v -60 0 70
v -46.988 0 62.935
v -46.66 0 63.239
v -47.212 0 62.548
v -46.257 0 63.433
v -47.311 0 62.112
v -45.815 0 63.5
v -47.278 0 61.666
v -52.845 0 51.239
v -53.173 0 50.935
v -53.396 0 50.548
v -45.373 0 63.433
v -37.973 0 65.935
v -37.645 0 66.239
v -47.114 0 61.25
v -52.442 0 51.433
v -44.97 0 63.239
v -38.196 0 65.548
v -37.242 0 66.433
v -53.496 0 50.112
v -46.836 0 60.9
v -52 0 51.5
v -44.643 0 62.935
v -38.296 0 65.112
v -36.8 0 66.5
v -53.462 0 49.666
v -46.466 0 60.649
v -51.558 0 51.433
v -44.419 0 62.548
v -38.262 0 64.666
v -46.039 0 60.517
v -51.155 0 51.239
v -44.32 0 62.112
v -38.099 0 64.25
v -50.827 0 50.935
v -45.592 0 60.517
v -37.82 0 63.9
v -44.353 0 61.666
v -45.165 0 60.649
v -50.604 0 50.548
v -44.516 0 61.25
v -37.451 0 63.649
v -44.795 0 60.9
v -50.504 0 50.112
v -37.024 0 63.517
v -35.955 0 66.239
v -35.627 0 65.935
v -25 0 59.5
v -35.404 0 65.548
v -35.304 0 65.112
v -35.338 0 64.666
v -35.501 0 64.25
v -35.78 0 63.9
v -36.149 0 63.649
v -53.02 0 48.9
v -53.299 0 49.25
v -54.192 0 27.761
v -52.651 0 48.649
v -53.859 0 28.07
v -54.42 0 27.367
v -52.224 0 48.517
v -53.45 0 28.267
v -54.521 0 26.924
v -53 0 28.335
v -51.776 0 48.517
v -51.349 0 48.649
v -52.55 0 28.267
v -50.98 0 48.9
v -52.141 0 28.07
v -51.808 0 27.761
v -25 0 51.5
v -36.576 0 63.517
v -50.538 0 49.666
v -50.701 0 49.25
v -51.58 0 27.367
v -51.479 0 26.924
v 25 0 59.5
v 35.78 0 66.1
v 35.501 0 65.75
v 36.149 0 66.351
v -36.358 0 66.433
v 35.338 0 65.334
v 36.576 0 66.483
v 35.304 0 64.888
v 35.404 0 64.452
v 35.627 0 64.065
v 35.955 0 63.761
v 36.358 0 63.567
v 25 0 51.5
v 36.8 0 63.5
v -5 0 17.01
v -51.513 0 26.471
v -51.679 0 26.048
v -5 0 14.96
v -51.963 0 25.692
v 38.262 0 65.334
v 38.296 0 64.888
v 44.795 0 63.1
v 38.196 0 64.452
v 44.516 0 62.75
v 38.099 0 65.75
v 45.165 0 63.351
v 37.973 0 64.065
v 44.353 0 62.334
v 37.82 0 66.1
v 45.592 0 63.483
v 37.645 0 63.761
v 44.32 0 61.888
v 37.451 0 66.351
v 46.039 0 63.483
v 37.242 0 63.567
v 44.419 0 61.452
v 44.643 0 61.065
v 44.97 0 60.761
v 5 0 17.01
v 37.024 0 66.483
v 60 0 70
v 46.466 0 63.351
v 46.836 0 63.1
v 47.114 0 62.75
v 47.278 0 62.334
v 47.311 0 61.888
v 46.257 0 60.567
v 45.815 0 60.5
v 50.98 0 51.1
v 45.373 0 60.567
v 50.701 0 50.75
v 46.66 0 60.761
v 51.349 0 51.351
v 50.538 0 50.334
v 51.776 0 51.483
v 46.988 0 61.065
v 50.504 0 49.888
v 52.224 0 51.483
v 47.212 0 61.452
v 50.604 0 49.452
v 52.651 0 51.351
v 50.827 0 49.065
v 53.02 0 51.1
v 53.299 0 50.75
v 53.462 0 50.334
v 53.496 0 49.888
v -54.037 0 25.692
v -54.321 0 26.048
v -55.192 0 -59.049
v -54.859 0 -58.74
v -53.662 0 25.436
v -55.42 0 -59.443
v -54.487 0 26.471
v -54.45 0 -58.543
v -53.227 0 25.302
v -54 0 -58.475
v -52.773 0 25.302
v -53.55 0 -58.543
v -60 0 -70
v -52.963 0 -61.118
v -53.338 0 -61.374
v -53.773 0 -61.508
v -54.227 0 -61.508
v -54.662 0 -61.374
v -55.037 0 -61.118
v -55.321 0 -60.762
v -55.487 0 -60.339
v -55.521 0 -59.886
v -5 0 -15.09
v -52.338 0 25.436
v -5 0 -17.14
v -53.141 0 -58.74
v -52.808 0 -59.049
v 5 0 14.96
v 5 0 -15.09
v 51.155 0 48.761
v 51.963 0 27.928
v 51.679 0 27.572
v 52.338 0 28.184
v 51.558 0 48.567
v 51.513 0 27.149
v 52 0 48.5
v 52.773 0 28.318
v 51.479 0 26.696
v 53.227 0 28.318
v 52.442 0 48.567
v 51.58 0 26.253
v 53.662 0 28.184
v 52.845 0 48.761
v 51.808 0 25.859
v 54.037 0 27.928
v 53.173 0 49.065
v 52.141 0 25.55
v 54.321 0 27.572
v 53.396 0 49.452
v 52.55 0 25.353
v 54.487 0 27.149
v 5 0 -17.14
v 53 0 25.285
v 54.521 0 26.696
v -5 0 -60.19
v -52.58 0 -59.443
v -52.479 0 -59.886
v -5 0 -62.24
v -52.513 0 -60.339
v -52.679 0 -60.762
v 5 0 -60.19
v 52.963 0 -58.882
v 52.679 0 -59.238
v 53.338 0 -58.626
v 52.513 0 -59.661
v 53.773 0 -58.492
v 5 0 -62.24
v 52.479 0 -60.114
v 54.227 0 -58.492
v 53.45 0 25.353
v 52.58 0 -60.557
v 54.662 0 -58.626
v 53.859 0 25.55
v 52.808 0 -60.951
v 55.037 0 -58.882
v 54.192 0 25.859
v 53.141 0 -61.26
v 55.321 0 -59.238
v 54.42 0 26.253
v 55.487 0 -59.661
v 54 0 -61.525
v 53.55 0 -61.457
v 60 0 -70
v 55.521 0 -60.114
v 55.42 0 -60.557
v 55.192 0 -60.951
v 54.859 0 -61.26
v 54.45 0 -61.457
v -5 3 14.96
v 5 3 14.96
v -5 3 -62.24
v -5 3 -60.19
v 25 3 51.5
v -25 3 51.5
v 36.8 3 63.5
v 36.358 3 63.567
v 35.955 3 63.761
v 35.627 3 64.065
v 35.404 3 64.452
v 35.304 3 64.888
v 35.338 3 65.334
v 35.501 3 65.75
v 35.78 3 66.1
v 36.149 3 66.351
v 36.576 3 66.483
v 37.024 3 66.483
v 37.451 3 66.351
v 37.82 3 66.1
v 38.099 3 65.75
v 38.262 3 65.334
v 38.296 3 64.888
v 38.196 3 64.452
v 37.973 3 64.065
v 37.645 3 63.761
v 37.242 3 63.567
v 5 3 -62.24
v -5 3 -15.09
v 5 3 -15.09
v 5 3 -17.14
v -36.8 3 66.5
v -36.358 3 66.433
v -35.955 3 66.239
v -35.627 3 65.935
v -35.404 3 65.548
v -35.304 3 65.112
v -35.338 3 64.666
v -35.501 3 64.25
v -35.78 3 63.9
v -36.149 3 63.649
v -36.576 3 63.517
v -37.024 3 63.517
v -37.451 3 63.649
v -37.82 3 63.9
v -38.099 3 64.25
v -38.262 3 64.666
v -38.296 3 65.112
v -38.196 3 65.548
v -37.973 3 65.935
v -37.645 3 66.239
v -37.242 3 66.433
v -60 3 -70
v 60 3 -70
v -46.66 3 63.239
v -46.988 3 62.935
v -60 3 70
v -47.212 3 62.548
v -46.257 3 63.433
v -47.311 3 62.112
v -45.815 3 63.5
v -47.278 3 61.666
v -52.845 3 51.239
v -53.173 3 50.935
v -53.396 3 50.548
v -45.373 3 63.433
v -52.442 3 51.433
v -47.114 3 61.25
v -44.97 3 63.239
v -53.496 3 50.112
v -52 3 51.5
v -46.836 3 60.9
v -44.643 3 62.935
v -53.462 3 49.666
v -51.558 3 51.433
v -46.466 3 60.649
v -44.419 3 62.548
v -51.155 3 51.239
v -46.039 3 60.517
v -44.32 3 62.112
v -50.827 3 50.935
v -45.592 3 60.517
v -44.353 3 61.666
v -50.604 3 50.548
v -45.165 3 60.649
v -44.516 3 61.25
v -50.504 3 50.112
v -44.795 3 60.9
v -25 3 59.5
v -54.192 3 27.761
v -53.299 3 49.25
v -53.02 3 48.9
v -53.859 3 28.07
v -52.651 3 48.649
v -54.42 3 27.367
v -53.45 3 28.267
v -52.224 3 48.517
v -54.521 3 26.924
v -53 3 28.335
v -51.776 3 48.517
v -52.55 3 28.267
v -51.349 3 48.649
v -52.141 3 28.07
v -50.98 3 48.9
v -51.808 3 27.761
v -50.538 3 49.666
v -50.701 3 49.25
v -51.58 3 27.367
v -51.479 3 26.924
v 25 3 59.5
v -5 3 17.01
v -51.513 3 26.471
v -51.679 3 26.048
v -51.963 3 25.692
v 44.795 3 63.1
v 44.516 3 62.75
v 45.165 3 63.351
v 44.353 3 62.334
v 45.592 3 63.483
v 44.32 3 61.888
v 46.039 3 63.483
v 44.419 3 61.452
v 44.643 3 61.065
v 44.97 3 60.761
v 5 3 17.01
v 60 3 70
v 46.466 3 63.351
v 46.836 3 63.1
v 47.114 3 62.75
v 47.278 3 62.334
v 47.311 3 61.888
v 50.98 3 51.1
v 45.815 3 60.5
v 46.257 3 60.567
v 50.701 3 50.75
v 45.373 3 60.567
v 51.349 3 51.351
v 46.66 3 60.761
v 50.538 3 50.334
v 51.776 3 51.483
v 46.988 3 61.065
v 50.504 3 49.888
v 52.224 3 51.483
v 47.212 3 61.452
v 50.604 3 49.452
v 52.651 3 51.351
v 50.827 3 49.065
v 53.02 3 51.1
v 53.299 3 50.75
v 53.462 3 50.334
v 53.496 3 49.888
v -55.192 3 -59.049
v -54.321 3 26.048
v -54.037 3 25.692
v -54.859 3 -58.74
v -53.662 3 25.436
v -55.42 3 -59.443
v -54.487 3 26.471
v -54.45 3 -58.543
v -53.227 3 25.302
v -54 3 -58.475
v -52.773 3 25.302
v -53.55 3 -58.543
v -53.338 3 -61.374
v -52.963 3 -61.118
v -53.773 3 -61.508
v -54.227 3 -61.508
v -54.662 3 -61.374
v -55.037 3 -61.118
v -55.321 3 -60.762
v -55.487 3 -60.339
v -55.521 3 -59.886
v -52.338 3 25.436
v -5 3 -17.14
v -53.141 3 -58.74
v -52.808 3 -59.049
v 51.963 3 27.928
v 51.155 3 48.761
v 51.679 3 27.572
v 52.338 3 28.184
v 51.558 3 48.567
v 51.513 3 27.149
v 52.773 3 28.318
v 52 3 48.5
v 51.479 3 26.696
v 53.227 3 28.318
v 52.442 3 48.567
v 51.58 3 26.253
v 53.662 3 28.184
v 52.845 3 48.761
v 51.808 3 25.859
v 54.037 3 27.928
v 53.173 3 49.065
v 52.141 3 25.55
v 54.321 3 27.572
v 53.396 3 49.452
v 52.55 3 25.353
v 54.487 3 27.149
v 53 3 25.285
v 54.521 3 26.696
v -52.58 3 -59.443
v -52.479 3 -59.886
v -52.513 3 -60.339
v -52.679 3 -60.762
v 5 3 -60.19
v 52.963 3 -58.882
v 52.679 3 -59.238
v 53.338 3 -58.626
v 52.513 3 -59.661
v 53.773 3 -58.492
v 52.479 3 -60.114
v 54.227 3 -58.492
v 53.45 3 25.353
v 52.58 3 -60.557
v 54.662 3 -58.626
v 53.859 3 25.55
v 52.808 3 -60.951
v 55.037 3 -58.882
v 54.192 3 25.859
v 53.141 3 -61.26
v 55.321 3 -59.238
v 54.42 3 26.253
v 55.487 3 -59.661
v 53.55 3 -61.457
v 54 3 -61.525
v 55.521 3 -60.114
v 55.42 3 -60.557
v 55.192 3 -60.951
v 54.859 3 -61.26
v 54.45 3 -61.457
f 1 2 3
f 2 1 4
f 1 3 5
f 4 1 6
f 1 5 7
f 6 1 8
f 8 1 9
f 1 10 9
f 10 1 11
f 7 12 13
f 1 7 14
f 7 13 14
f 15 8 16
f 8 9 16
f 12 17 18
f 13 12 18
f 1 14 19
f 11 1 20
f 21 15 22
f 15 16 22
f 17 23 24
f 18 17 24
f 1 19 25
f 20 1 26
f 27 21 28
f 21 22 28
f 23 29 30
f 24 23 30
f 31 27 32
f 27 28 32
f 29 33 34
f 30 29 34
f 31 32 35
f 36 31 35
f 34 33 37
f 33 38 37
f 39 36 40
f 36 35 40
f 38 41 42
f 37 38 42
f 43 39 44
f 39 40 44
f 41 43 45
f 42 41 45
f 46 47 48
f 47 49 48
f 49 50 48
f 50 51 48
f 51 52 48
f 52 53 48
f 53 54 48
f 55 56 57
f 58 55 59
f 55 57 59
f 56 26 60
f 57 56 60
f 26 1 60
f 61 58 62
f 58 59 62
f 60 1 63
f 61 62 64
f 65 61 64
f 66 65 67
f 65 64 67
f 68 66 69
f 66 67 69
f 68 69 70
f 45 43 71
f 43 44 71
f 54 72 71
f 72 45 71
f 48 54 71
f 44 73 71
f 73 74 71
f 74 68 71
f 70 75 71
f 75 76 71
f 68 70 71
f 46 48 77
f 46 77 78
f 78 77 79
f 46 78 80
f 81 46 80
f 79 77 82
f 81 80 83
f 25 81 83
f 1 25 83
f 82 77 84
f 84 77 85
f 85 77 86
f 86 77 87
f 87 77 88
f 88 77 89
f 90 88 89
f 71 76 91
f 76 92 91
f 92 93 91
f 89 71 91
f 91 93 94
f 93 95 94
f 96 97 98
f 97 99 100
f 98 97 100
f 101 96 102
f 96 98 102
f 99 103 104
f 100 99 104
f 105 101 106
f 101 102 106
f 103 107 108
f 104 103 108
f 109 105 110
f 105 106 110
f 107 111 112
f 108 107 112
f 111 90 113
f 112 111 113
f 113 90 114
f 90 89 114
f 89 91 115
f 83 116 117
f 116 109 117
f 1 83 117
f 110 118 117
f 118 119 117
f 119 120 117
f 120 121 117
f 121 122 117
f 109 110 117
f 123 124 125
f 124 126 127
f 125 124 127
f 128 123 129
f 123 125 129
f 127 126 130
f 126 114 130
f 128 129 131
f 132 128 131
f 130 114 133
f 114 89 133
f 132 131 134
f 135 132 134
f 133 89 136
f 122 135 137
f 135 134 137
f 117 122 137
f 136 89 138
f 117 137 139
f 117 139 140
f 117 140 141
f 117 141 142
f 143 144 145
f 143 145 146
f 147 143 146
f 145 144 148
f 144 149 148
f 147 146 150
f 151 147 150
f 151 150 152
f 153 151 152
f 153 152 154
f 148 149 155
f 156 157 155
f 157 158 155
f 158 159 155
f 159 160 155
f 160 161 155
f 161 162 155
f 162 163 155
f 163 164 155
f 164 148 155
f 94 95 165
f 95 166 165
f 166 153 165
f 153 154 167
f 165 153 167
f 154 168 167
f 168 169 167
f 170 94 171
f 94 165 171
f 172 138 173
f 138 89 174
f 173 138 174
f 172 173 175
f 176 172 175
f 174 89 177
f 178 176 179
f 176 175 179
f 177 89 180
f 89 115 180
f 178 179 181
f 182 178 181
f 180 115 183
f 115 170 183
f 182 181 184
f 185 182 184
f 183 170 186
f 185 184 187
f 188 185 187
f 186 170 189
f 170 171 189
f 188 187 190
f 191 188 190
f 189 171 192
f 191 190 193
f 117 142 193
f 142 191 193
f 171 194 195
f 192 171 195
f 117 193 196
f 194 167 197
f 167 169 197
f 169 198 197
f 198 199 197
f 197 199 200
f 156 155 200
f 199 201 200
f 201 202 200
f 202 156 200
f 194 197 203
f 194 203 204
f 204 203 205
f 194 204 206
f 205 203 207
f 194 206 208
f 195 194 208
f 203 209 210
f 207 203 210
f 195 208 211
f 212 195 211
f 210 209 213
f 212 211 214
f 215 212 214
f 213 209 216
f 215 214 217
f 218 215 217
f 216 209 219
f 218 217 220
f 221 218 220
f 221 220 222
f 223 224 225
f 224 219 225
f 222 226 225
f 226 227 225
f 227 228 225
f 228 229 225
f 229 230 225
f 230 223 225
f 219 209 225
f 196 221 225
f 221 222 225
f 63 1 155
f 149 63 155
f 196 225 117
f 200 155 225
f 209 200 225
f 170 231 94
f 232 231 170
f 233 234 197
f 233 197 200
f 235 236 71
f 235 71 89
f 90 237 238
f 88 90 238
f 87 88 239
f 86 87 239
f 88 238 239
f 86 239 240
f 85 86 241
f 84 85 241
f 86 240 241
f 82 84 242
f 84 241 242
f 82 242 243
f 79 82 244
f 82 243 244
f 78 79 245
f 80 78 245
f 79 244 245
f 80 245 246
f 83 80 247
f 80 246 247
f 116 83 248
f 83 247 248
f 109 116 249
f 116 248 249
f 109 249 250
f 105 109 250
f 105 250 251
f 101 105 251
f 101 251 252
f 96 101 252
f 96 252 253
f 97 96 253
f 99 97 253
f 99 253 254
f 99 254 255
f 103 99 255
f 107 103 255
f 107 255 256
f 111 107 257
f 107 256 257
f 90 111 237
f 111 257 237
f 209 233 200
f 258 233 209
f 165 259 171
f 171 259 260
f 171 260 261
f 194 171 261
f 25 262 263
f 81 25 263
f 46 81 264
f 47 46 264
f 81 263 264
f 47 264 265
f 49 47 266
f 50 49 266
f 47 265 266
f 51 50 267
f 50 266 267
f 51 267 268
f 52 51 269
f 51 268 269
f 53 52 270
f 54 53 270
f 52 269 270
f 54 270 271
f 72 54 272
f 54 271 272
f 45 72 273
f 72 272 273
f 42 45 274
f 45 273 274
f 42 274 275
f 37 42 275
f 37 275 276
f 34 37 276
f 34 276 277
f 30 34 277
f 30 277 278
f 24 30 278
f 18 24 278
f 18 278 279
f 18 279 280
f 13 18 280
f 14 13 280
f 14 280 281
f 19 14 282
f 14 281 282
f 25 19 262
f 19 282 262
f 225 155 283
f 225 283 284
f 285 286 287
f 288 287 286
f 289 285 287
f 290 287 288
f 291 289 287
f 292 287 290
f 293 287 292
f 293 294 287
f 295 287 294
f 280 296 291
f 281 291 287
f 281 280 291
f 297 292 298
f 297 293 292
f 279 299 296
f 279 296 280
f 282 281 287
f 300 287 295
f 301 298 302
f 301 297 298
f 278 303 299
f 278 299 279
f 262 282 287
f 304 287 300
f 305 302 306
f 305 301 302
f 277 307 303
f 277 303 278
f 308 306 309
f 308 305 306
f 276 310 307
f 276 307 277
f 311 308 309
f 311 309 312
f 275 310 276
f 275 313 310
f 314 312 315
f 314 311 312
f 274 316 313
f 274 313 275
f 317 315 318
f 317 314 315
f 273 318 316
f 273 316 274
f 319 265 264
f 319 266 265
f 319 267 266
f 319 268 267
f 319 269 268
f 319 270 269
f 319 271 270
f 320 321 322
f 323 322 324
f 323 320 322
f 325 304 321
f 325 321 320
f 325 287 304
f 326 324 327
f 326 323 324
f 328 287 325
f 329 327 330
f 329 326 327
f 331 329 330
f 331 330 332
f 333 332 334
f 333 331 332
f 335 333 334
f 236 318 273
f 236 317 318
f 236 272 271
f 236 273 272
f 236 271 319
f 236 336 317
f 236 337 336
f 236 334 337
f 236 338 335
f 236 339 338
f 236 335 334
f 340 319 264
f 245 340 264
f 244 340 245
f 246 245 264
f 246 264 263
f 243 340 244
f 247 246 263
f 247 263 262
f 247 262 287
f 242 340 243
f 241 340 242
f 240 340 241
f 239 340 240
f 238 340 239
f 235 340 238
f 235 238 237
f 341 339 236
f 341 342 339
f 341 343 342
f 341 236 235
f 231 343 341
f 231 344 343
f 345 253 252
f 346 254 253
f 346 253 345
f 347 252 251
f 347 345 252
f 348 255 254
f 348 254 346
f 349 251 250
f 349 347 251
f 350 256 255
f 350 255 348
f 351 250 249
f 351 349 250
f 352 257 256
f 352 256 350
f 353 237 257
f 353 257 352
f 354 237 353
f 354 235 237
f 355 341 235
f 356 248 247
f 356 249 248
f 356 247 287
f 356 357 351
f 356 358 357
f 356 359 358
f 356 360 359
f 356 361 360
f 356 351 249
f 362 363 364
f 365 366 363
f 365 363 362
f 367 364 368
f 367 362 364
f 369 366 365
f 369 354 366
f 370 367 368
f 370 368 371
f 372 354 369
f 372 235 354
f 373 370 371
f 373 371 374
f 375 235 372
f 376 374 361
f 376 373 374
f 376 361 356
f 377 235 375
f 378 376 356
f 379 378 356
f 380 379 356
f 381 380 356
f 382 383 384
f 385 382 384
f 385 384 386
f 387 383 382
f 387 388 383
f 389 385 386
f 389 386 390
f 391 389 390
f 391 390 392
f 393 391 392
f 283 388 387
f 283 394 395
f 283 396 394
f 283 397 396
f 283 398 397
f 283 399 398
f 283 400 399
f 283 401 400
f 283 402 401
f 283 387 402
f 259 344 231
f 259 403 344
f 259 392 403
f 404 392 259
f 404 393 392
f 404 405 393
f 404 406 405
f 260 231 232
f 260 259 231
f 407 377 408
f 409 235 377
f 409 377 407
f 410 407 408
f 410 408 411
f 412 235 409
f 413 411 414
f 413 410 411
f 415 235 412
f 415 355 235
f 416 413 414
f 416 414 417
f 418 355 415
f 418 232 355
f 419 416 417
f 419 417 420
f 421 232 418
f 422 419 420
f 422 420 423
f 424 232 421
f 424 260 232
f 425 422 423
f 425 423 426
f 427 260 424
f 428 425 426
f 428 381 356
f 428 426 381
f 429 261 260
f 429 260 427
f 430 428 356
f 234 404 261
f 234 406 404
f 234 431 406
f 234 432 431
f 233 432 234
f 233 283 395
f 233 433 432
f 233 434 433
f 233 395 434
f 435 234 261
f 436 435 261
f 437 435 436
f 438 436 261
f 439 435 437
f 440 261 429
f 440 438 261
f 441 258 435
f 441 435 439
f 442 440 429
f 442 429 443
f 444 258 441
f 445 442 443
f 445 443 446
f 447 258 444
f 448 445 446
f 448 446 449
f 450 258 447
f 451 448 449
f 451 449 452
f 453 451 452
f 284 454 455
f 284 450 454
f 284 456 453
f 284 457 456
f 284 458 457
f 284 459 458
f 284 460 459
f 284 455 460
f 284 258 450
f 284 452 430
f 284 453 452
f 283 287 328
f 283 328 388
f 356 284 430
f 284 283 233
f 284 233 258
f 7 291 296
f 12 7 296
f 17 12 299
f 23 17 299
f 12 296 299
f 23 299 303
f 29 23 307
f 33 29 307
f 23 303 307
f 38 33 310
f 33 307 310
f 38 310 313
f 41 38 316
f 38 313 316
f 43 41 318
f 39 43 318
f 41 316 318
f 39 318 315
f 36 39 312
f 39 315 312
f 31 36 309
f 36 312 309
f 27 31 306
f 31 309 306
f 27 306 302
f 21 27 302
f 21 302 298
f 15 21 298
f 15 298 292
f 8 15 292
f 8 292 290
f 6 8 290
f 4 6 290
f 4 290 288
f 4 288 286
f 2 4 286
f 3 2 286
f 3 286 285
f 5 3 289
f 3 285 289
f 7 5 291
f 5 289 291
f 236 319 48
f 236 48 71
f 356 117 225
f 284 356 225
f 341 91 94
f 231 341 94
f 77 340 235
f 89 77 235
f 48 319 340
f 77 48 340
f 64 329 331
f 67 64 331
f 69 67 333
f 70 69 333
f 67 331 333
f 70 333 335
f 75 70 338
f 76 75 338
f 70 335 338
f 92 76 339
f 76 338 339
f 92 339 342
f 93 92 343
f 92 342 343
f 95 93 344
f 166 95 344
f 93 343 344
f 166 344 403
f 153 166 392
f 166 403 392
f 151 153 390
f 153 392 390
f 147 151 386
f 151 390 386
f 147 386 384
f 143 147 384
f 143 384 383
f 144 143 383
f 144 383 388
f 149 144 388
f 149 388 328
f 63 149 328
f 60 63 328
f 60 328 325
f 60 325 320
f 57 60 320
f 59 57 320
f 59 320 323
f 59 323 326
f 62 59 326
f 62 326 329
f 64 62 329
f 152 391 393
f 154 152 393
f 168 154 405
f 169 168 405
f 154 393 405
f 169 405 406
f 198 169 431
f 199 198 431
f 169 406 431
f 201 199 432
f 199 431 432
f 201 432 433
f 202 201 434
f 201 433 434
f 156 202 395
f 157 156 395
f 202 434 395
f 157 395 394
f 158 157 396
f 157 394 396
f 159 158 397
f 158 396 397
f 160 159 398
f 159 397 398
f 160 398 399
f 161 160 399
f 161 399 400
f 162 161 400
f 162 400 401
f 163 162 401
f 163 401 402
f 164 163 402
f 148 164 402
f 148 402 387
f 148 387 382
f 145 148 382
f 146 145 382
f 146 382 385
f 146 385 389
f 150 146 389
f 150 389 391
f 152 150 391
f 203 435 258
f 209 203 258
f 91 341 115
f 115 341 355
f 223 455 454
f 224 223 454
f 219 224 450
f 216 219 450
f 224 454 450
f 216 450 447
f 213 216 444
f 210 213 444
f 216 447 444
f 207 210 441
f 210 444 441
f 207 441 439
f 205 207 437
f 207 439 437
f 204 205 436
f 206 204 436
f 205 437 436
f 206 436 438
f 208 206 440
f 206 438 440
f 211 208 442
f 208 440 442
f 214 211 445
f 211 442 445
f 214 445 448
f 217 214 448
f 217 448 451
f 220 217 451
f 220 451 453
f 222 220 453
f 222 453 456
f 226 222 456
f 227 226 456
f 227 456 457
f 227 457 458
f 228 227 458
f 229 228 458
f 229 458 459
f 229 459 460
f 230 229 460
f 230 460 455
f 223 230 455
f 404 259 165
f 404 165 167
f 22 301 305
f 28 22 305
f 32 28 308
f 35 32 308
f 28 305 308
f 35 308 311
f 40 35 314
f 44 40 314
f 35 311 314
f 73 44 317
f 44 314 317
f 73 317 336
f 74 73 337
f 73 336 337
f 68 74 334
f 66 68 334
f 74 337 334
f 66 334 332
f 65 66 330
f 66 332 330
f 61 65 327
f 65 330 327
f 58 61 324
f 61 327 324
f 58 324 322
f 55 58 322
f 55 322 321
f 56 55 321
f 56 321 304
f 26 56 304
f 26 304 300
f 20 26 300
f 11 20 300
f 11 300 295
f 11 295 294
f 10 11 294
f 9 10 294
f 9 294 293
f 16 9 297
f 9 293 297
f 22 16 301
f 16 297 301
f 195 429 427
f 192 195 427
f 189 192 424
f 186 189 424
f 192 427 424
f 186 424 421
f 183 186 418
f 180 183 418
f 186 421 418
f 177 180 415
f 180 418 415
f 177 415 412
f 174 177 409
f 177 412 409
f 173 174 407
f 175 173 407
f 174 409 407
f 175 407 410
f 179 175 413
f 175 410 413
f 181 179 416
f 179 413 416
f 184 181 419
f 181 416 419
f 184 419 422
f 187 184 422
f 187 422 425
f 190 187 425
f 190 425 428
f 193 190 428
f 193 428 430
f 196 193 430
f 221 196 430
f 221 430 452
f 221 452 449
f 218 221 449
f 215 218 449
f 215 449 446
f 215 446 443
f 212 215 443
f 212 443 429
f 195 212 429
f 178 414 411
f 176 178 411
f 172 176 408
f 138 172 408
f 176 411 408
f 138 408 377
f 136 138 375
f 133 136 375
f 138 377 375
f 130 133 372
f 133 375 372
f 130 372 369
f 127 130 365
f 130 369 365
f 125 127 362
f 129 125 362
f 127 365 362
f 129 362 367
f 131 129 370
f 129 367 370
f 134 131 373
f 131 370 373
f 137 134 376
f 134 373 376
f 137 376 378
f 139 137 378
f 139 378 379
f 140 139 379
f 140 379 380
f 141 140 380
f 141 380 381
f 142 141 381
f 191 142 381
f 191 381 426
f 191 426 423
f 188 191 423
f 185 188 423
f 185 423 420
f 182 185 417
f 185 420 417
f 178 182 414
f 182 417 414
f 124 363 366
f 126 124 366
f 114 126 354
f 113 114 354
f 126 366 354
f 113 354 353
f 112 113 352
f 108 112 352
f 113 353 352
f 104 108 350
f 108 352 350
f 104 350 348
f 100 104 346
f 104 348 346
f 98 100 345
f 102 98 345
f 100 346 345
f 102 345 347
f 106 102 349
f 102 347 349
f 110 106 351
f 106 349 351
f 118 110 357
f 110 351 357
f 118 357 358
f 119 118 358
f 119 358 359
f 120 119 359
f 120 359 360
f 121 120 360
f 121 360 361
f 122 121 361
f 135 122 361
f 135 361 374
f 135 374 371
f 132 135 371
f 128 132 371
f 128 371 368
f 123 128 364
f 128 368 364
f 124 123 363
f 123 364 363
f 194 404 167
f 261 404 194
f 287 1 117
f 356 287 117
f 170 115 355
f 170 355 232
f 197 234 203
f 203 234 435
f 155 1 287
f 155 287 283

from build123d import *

# Parameters (mm, degrees)
SKETCH1_W           = 120
SKETCH1_H           = 140
BOSS_EXTRUDE1_DEPTH = 3
SKETCH2_R           = 1.525
CUT_EXTRUDE1_DEPTH  = 93.244241013
SKETCH3_W           = 10
SKETCH3_H           = 2.05
CUT_EXTRUDE2_DEPTH  = 93.244241013
SKETCH4_R           = 1.5
CUT_EXTRUDE3_DEPTH  = 3
SKETCH5_R           = 1.5
SKETCH5_W           = 50
SKETCH5_H           = 8
CUT_EXTRUDE4_DEPTH  = 3


with BuildPart() as part:
    # Sketch1 → Boss-Extrude1 (new body)
    with BuildSketch(Plane(origin=(0, 0, 0), x_dir=(1, 0, 0), z_dir=(0, 1, 0))):
        Rectangle(SKETCH1_W, SKETCH1_H)
    extrude(amount=BOSS_EXTRUDE1_DEPTH)

    # Sketch2 → Cut-Extrude1 (cut, through all)
    with BuildSketch(Plane(origin=(0, 3, 0), x_dir=(1, 0, 0), z_dir=(0, 1, 0))):
        with Locations(Location((-53, -26.81, 0), (0, 0, 270))):
            Circle(SKETCH2_R)
        with Locations(Location((-54, 60, 0), (0, 0, 270))):
            Circle(SKETCH2_R)
        with Locations(Location((53, -26.81, 0), (0, 0, 90))):
            Circle(SKETCH2_R)
        with Locations(Location((54, 60, 0), (0, 0, 90))):
            Circle(SKETCH2_R)
    extrude(amount=-CUT_EXTRUDE1_DEPTH, mode=Mode.SUBTRACT)

    # Sketch3 → Cut-Extrude2 (cut, through all)
    with BuildSketch(Plane(origin=(0, 3, 0), x_dir=(1, 0, 0), z_dir=(0, 1, 0))):
        with Locations((0, 16.115)):
            Rectangle(SKETCH3_W, SKETCH3_H)
        with Locations((0, -15.985)):
            Rectangle(SKETCH3_W, SKETCH3_H)
        with Locations((0, 61.215)):
            Rectangle(SKETCH3_W, SKETCH3_H)
    extrude(amount=-CUT_EXTRUDE2_DEPTH, mode=Mode.SUBTRACT)

    # Sketch4 → Cut-Extrude3 (cut)
    with BuildSketch(Plane(origin=(0, 3, 0), x_dir=(1, 0, 0), z_dir=(0, 1, 0))):
        with Locations(Location((-52, -50, 0), (0, 0, 270))):
            Circle(SKETCH4_R)
        with Locations(Location((-45.815341562, -62, 0), (0, 0, 270))):
            Circle(SKETCH4_R)
        with Locations(Location((45.815341562, -62, 0), (0, 0, 90))):
            Circle(SKETCH4_R)
        with Locations(Location((52, -50, 0), (0, 0, 90))):
            Circle(SKETCH4_R)
    extrude(amount=-CUT_EXTRUDE3_DEPTH, mode=Mode.SUBTRACT)

    # Sketch5 → Cut-Extrude4 (cut)
    with BuildSketch(Plane(origin=(0, 3, 0), x_dir=(1, 0, 0), z_dir=(0, 1, 0))):
        with Locations(Location((-36.8, -65, 0), (0, 0, 270))):
            Circle(SKETCH5_R)
        with Locations(Location((36.8, -65, 0), (0, 0, 90))):
            Circle(SKETCH5_R)
        with Locations((0, -55.5)):
            Rectangle(SKETCH5_W, SKETCH5_H)
    extrude(amount=-CUT_EXTRUDE4_DEPTH, mode=Mode.SUBTRACT)


solid = part.part
